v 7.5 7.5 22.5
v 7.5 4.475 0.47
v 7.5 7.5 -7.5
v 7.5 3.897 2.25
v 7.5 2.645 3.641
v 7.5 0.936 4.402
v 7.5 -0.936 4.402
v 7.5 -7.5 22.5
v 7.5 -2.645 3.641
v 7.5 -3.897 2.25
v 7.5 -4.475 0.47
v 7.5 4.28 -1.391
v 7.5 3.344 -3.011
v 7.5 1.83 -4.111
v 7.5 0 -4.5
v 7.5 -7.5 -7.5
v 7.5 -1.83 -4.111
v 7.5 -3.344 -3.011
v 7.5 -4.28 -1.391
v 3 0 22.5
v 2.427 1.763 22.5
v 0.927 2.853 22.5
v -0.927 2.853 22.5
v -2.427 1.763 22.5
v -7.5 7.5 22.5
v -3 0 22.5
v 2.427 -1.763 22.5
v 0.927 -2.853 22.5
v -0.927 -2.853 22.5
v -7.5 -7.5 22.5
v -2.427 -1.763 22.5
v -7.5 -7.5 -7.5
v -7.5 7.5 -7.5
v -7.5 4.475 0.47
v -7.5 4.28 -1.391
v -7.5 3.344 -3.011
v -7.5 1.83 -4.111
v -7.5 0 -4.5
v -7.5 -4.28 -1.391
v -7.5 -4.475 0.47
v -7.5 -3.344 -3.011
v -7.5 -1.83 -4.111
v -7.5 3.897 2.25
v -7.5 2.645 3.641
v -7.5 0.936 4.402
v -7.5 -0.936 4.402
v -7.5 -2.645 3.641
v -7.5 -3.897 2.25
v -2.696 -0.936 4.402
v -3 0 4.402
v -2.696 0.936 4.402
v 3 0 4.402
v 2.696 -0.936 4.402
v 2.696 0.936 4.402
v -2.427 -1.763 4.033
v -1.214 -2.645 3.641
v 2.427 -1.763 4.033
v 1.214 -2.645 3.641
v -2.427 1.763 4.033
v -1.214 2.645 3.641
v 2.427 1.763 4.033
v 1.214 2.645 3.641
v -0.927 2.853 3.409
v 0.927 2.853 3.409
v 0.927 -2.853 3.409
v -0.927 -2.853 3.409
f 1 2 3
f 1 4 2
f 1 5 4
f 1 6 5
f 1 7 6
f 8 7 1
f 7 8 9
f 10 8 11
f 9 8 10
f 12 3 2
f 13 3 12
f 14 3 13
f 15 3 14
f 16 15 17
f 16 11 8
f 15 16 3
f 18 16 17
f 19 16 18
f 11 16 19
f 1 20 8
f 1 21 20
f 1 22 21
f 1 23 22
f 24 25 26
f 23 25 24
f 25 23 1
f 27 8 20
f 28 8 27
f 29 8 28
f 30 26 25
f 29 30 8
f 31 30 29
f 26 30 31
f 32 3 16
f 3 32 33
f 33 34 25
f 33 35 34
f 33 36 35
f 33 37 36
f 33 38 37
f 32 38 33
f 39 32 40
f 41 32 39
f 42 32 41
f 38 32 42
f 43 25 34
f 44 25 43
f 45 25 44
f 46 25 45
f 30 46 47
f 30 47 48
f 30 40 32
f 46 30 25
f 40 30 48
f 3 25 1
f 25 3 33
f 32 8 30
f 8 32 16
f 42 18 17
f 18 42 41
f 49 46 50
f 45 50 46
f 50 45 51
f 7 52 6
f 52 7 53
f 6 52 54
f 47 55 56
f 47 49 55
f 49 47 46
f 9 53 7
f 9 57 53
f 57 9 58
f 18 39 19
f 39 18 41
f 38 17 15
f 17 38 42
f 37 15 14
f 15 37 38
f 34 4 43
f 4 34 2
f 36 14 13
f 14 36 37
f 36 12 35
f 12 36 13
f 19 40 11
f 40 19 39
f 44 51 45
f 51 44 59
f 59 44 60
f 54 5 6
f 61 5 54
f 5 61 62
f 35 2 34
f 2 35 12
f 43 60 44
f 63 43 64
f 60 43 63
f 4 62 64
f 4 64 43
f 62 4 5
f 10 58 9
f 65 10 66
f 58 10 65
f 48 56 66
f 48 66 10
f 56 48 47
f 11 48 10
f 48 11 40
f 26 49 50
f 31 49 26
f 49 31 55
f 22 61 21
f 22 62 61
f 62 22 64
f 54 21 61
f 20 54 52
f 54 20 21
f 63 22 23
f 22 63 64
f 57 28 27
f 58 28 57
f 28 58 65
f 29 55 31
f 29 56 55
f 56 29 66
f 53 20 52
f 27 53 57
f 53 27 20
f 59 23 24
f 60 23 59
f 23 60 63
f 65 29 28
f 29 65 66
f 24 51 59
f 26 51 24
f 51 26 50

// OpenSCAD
// Pipe bore
r1 = 4.5;
// Sensor bore
r2 = 3.0;
w1 = 15.0;
w2 = 15.0;
w3 = 30.0;

difference()
{
   translate([-w1/2, -w2/2, -w2/2])
      cube([w1, w2, w3]);

   rotate([0,90,0])
      translate([0,0,-w2/2-1])
         cylinder(r = r1, h = w2+2);

   cylinder(r = r2, h = w3);
}
